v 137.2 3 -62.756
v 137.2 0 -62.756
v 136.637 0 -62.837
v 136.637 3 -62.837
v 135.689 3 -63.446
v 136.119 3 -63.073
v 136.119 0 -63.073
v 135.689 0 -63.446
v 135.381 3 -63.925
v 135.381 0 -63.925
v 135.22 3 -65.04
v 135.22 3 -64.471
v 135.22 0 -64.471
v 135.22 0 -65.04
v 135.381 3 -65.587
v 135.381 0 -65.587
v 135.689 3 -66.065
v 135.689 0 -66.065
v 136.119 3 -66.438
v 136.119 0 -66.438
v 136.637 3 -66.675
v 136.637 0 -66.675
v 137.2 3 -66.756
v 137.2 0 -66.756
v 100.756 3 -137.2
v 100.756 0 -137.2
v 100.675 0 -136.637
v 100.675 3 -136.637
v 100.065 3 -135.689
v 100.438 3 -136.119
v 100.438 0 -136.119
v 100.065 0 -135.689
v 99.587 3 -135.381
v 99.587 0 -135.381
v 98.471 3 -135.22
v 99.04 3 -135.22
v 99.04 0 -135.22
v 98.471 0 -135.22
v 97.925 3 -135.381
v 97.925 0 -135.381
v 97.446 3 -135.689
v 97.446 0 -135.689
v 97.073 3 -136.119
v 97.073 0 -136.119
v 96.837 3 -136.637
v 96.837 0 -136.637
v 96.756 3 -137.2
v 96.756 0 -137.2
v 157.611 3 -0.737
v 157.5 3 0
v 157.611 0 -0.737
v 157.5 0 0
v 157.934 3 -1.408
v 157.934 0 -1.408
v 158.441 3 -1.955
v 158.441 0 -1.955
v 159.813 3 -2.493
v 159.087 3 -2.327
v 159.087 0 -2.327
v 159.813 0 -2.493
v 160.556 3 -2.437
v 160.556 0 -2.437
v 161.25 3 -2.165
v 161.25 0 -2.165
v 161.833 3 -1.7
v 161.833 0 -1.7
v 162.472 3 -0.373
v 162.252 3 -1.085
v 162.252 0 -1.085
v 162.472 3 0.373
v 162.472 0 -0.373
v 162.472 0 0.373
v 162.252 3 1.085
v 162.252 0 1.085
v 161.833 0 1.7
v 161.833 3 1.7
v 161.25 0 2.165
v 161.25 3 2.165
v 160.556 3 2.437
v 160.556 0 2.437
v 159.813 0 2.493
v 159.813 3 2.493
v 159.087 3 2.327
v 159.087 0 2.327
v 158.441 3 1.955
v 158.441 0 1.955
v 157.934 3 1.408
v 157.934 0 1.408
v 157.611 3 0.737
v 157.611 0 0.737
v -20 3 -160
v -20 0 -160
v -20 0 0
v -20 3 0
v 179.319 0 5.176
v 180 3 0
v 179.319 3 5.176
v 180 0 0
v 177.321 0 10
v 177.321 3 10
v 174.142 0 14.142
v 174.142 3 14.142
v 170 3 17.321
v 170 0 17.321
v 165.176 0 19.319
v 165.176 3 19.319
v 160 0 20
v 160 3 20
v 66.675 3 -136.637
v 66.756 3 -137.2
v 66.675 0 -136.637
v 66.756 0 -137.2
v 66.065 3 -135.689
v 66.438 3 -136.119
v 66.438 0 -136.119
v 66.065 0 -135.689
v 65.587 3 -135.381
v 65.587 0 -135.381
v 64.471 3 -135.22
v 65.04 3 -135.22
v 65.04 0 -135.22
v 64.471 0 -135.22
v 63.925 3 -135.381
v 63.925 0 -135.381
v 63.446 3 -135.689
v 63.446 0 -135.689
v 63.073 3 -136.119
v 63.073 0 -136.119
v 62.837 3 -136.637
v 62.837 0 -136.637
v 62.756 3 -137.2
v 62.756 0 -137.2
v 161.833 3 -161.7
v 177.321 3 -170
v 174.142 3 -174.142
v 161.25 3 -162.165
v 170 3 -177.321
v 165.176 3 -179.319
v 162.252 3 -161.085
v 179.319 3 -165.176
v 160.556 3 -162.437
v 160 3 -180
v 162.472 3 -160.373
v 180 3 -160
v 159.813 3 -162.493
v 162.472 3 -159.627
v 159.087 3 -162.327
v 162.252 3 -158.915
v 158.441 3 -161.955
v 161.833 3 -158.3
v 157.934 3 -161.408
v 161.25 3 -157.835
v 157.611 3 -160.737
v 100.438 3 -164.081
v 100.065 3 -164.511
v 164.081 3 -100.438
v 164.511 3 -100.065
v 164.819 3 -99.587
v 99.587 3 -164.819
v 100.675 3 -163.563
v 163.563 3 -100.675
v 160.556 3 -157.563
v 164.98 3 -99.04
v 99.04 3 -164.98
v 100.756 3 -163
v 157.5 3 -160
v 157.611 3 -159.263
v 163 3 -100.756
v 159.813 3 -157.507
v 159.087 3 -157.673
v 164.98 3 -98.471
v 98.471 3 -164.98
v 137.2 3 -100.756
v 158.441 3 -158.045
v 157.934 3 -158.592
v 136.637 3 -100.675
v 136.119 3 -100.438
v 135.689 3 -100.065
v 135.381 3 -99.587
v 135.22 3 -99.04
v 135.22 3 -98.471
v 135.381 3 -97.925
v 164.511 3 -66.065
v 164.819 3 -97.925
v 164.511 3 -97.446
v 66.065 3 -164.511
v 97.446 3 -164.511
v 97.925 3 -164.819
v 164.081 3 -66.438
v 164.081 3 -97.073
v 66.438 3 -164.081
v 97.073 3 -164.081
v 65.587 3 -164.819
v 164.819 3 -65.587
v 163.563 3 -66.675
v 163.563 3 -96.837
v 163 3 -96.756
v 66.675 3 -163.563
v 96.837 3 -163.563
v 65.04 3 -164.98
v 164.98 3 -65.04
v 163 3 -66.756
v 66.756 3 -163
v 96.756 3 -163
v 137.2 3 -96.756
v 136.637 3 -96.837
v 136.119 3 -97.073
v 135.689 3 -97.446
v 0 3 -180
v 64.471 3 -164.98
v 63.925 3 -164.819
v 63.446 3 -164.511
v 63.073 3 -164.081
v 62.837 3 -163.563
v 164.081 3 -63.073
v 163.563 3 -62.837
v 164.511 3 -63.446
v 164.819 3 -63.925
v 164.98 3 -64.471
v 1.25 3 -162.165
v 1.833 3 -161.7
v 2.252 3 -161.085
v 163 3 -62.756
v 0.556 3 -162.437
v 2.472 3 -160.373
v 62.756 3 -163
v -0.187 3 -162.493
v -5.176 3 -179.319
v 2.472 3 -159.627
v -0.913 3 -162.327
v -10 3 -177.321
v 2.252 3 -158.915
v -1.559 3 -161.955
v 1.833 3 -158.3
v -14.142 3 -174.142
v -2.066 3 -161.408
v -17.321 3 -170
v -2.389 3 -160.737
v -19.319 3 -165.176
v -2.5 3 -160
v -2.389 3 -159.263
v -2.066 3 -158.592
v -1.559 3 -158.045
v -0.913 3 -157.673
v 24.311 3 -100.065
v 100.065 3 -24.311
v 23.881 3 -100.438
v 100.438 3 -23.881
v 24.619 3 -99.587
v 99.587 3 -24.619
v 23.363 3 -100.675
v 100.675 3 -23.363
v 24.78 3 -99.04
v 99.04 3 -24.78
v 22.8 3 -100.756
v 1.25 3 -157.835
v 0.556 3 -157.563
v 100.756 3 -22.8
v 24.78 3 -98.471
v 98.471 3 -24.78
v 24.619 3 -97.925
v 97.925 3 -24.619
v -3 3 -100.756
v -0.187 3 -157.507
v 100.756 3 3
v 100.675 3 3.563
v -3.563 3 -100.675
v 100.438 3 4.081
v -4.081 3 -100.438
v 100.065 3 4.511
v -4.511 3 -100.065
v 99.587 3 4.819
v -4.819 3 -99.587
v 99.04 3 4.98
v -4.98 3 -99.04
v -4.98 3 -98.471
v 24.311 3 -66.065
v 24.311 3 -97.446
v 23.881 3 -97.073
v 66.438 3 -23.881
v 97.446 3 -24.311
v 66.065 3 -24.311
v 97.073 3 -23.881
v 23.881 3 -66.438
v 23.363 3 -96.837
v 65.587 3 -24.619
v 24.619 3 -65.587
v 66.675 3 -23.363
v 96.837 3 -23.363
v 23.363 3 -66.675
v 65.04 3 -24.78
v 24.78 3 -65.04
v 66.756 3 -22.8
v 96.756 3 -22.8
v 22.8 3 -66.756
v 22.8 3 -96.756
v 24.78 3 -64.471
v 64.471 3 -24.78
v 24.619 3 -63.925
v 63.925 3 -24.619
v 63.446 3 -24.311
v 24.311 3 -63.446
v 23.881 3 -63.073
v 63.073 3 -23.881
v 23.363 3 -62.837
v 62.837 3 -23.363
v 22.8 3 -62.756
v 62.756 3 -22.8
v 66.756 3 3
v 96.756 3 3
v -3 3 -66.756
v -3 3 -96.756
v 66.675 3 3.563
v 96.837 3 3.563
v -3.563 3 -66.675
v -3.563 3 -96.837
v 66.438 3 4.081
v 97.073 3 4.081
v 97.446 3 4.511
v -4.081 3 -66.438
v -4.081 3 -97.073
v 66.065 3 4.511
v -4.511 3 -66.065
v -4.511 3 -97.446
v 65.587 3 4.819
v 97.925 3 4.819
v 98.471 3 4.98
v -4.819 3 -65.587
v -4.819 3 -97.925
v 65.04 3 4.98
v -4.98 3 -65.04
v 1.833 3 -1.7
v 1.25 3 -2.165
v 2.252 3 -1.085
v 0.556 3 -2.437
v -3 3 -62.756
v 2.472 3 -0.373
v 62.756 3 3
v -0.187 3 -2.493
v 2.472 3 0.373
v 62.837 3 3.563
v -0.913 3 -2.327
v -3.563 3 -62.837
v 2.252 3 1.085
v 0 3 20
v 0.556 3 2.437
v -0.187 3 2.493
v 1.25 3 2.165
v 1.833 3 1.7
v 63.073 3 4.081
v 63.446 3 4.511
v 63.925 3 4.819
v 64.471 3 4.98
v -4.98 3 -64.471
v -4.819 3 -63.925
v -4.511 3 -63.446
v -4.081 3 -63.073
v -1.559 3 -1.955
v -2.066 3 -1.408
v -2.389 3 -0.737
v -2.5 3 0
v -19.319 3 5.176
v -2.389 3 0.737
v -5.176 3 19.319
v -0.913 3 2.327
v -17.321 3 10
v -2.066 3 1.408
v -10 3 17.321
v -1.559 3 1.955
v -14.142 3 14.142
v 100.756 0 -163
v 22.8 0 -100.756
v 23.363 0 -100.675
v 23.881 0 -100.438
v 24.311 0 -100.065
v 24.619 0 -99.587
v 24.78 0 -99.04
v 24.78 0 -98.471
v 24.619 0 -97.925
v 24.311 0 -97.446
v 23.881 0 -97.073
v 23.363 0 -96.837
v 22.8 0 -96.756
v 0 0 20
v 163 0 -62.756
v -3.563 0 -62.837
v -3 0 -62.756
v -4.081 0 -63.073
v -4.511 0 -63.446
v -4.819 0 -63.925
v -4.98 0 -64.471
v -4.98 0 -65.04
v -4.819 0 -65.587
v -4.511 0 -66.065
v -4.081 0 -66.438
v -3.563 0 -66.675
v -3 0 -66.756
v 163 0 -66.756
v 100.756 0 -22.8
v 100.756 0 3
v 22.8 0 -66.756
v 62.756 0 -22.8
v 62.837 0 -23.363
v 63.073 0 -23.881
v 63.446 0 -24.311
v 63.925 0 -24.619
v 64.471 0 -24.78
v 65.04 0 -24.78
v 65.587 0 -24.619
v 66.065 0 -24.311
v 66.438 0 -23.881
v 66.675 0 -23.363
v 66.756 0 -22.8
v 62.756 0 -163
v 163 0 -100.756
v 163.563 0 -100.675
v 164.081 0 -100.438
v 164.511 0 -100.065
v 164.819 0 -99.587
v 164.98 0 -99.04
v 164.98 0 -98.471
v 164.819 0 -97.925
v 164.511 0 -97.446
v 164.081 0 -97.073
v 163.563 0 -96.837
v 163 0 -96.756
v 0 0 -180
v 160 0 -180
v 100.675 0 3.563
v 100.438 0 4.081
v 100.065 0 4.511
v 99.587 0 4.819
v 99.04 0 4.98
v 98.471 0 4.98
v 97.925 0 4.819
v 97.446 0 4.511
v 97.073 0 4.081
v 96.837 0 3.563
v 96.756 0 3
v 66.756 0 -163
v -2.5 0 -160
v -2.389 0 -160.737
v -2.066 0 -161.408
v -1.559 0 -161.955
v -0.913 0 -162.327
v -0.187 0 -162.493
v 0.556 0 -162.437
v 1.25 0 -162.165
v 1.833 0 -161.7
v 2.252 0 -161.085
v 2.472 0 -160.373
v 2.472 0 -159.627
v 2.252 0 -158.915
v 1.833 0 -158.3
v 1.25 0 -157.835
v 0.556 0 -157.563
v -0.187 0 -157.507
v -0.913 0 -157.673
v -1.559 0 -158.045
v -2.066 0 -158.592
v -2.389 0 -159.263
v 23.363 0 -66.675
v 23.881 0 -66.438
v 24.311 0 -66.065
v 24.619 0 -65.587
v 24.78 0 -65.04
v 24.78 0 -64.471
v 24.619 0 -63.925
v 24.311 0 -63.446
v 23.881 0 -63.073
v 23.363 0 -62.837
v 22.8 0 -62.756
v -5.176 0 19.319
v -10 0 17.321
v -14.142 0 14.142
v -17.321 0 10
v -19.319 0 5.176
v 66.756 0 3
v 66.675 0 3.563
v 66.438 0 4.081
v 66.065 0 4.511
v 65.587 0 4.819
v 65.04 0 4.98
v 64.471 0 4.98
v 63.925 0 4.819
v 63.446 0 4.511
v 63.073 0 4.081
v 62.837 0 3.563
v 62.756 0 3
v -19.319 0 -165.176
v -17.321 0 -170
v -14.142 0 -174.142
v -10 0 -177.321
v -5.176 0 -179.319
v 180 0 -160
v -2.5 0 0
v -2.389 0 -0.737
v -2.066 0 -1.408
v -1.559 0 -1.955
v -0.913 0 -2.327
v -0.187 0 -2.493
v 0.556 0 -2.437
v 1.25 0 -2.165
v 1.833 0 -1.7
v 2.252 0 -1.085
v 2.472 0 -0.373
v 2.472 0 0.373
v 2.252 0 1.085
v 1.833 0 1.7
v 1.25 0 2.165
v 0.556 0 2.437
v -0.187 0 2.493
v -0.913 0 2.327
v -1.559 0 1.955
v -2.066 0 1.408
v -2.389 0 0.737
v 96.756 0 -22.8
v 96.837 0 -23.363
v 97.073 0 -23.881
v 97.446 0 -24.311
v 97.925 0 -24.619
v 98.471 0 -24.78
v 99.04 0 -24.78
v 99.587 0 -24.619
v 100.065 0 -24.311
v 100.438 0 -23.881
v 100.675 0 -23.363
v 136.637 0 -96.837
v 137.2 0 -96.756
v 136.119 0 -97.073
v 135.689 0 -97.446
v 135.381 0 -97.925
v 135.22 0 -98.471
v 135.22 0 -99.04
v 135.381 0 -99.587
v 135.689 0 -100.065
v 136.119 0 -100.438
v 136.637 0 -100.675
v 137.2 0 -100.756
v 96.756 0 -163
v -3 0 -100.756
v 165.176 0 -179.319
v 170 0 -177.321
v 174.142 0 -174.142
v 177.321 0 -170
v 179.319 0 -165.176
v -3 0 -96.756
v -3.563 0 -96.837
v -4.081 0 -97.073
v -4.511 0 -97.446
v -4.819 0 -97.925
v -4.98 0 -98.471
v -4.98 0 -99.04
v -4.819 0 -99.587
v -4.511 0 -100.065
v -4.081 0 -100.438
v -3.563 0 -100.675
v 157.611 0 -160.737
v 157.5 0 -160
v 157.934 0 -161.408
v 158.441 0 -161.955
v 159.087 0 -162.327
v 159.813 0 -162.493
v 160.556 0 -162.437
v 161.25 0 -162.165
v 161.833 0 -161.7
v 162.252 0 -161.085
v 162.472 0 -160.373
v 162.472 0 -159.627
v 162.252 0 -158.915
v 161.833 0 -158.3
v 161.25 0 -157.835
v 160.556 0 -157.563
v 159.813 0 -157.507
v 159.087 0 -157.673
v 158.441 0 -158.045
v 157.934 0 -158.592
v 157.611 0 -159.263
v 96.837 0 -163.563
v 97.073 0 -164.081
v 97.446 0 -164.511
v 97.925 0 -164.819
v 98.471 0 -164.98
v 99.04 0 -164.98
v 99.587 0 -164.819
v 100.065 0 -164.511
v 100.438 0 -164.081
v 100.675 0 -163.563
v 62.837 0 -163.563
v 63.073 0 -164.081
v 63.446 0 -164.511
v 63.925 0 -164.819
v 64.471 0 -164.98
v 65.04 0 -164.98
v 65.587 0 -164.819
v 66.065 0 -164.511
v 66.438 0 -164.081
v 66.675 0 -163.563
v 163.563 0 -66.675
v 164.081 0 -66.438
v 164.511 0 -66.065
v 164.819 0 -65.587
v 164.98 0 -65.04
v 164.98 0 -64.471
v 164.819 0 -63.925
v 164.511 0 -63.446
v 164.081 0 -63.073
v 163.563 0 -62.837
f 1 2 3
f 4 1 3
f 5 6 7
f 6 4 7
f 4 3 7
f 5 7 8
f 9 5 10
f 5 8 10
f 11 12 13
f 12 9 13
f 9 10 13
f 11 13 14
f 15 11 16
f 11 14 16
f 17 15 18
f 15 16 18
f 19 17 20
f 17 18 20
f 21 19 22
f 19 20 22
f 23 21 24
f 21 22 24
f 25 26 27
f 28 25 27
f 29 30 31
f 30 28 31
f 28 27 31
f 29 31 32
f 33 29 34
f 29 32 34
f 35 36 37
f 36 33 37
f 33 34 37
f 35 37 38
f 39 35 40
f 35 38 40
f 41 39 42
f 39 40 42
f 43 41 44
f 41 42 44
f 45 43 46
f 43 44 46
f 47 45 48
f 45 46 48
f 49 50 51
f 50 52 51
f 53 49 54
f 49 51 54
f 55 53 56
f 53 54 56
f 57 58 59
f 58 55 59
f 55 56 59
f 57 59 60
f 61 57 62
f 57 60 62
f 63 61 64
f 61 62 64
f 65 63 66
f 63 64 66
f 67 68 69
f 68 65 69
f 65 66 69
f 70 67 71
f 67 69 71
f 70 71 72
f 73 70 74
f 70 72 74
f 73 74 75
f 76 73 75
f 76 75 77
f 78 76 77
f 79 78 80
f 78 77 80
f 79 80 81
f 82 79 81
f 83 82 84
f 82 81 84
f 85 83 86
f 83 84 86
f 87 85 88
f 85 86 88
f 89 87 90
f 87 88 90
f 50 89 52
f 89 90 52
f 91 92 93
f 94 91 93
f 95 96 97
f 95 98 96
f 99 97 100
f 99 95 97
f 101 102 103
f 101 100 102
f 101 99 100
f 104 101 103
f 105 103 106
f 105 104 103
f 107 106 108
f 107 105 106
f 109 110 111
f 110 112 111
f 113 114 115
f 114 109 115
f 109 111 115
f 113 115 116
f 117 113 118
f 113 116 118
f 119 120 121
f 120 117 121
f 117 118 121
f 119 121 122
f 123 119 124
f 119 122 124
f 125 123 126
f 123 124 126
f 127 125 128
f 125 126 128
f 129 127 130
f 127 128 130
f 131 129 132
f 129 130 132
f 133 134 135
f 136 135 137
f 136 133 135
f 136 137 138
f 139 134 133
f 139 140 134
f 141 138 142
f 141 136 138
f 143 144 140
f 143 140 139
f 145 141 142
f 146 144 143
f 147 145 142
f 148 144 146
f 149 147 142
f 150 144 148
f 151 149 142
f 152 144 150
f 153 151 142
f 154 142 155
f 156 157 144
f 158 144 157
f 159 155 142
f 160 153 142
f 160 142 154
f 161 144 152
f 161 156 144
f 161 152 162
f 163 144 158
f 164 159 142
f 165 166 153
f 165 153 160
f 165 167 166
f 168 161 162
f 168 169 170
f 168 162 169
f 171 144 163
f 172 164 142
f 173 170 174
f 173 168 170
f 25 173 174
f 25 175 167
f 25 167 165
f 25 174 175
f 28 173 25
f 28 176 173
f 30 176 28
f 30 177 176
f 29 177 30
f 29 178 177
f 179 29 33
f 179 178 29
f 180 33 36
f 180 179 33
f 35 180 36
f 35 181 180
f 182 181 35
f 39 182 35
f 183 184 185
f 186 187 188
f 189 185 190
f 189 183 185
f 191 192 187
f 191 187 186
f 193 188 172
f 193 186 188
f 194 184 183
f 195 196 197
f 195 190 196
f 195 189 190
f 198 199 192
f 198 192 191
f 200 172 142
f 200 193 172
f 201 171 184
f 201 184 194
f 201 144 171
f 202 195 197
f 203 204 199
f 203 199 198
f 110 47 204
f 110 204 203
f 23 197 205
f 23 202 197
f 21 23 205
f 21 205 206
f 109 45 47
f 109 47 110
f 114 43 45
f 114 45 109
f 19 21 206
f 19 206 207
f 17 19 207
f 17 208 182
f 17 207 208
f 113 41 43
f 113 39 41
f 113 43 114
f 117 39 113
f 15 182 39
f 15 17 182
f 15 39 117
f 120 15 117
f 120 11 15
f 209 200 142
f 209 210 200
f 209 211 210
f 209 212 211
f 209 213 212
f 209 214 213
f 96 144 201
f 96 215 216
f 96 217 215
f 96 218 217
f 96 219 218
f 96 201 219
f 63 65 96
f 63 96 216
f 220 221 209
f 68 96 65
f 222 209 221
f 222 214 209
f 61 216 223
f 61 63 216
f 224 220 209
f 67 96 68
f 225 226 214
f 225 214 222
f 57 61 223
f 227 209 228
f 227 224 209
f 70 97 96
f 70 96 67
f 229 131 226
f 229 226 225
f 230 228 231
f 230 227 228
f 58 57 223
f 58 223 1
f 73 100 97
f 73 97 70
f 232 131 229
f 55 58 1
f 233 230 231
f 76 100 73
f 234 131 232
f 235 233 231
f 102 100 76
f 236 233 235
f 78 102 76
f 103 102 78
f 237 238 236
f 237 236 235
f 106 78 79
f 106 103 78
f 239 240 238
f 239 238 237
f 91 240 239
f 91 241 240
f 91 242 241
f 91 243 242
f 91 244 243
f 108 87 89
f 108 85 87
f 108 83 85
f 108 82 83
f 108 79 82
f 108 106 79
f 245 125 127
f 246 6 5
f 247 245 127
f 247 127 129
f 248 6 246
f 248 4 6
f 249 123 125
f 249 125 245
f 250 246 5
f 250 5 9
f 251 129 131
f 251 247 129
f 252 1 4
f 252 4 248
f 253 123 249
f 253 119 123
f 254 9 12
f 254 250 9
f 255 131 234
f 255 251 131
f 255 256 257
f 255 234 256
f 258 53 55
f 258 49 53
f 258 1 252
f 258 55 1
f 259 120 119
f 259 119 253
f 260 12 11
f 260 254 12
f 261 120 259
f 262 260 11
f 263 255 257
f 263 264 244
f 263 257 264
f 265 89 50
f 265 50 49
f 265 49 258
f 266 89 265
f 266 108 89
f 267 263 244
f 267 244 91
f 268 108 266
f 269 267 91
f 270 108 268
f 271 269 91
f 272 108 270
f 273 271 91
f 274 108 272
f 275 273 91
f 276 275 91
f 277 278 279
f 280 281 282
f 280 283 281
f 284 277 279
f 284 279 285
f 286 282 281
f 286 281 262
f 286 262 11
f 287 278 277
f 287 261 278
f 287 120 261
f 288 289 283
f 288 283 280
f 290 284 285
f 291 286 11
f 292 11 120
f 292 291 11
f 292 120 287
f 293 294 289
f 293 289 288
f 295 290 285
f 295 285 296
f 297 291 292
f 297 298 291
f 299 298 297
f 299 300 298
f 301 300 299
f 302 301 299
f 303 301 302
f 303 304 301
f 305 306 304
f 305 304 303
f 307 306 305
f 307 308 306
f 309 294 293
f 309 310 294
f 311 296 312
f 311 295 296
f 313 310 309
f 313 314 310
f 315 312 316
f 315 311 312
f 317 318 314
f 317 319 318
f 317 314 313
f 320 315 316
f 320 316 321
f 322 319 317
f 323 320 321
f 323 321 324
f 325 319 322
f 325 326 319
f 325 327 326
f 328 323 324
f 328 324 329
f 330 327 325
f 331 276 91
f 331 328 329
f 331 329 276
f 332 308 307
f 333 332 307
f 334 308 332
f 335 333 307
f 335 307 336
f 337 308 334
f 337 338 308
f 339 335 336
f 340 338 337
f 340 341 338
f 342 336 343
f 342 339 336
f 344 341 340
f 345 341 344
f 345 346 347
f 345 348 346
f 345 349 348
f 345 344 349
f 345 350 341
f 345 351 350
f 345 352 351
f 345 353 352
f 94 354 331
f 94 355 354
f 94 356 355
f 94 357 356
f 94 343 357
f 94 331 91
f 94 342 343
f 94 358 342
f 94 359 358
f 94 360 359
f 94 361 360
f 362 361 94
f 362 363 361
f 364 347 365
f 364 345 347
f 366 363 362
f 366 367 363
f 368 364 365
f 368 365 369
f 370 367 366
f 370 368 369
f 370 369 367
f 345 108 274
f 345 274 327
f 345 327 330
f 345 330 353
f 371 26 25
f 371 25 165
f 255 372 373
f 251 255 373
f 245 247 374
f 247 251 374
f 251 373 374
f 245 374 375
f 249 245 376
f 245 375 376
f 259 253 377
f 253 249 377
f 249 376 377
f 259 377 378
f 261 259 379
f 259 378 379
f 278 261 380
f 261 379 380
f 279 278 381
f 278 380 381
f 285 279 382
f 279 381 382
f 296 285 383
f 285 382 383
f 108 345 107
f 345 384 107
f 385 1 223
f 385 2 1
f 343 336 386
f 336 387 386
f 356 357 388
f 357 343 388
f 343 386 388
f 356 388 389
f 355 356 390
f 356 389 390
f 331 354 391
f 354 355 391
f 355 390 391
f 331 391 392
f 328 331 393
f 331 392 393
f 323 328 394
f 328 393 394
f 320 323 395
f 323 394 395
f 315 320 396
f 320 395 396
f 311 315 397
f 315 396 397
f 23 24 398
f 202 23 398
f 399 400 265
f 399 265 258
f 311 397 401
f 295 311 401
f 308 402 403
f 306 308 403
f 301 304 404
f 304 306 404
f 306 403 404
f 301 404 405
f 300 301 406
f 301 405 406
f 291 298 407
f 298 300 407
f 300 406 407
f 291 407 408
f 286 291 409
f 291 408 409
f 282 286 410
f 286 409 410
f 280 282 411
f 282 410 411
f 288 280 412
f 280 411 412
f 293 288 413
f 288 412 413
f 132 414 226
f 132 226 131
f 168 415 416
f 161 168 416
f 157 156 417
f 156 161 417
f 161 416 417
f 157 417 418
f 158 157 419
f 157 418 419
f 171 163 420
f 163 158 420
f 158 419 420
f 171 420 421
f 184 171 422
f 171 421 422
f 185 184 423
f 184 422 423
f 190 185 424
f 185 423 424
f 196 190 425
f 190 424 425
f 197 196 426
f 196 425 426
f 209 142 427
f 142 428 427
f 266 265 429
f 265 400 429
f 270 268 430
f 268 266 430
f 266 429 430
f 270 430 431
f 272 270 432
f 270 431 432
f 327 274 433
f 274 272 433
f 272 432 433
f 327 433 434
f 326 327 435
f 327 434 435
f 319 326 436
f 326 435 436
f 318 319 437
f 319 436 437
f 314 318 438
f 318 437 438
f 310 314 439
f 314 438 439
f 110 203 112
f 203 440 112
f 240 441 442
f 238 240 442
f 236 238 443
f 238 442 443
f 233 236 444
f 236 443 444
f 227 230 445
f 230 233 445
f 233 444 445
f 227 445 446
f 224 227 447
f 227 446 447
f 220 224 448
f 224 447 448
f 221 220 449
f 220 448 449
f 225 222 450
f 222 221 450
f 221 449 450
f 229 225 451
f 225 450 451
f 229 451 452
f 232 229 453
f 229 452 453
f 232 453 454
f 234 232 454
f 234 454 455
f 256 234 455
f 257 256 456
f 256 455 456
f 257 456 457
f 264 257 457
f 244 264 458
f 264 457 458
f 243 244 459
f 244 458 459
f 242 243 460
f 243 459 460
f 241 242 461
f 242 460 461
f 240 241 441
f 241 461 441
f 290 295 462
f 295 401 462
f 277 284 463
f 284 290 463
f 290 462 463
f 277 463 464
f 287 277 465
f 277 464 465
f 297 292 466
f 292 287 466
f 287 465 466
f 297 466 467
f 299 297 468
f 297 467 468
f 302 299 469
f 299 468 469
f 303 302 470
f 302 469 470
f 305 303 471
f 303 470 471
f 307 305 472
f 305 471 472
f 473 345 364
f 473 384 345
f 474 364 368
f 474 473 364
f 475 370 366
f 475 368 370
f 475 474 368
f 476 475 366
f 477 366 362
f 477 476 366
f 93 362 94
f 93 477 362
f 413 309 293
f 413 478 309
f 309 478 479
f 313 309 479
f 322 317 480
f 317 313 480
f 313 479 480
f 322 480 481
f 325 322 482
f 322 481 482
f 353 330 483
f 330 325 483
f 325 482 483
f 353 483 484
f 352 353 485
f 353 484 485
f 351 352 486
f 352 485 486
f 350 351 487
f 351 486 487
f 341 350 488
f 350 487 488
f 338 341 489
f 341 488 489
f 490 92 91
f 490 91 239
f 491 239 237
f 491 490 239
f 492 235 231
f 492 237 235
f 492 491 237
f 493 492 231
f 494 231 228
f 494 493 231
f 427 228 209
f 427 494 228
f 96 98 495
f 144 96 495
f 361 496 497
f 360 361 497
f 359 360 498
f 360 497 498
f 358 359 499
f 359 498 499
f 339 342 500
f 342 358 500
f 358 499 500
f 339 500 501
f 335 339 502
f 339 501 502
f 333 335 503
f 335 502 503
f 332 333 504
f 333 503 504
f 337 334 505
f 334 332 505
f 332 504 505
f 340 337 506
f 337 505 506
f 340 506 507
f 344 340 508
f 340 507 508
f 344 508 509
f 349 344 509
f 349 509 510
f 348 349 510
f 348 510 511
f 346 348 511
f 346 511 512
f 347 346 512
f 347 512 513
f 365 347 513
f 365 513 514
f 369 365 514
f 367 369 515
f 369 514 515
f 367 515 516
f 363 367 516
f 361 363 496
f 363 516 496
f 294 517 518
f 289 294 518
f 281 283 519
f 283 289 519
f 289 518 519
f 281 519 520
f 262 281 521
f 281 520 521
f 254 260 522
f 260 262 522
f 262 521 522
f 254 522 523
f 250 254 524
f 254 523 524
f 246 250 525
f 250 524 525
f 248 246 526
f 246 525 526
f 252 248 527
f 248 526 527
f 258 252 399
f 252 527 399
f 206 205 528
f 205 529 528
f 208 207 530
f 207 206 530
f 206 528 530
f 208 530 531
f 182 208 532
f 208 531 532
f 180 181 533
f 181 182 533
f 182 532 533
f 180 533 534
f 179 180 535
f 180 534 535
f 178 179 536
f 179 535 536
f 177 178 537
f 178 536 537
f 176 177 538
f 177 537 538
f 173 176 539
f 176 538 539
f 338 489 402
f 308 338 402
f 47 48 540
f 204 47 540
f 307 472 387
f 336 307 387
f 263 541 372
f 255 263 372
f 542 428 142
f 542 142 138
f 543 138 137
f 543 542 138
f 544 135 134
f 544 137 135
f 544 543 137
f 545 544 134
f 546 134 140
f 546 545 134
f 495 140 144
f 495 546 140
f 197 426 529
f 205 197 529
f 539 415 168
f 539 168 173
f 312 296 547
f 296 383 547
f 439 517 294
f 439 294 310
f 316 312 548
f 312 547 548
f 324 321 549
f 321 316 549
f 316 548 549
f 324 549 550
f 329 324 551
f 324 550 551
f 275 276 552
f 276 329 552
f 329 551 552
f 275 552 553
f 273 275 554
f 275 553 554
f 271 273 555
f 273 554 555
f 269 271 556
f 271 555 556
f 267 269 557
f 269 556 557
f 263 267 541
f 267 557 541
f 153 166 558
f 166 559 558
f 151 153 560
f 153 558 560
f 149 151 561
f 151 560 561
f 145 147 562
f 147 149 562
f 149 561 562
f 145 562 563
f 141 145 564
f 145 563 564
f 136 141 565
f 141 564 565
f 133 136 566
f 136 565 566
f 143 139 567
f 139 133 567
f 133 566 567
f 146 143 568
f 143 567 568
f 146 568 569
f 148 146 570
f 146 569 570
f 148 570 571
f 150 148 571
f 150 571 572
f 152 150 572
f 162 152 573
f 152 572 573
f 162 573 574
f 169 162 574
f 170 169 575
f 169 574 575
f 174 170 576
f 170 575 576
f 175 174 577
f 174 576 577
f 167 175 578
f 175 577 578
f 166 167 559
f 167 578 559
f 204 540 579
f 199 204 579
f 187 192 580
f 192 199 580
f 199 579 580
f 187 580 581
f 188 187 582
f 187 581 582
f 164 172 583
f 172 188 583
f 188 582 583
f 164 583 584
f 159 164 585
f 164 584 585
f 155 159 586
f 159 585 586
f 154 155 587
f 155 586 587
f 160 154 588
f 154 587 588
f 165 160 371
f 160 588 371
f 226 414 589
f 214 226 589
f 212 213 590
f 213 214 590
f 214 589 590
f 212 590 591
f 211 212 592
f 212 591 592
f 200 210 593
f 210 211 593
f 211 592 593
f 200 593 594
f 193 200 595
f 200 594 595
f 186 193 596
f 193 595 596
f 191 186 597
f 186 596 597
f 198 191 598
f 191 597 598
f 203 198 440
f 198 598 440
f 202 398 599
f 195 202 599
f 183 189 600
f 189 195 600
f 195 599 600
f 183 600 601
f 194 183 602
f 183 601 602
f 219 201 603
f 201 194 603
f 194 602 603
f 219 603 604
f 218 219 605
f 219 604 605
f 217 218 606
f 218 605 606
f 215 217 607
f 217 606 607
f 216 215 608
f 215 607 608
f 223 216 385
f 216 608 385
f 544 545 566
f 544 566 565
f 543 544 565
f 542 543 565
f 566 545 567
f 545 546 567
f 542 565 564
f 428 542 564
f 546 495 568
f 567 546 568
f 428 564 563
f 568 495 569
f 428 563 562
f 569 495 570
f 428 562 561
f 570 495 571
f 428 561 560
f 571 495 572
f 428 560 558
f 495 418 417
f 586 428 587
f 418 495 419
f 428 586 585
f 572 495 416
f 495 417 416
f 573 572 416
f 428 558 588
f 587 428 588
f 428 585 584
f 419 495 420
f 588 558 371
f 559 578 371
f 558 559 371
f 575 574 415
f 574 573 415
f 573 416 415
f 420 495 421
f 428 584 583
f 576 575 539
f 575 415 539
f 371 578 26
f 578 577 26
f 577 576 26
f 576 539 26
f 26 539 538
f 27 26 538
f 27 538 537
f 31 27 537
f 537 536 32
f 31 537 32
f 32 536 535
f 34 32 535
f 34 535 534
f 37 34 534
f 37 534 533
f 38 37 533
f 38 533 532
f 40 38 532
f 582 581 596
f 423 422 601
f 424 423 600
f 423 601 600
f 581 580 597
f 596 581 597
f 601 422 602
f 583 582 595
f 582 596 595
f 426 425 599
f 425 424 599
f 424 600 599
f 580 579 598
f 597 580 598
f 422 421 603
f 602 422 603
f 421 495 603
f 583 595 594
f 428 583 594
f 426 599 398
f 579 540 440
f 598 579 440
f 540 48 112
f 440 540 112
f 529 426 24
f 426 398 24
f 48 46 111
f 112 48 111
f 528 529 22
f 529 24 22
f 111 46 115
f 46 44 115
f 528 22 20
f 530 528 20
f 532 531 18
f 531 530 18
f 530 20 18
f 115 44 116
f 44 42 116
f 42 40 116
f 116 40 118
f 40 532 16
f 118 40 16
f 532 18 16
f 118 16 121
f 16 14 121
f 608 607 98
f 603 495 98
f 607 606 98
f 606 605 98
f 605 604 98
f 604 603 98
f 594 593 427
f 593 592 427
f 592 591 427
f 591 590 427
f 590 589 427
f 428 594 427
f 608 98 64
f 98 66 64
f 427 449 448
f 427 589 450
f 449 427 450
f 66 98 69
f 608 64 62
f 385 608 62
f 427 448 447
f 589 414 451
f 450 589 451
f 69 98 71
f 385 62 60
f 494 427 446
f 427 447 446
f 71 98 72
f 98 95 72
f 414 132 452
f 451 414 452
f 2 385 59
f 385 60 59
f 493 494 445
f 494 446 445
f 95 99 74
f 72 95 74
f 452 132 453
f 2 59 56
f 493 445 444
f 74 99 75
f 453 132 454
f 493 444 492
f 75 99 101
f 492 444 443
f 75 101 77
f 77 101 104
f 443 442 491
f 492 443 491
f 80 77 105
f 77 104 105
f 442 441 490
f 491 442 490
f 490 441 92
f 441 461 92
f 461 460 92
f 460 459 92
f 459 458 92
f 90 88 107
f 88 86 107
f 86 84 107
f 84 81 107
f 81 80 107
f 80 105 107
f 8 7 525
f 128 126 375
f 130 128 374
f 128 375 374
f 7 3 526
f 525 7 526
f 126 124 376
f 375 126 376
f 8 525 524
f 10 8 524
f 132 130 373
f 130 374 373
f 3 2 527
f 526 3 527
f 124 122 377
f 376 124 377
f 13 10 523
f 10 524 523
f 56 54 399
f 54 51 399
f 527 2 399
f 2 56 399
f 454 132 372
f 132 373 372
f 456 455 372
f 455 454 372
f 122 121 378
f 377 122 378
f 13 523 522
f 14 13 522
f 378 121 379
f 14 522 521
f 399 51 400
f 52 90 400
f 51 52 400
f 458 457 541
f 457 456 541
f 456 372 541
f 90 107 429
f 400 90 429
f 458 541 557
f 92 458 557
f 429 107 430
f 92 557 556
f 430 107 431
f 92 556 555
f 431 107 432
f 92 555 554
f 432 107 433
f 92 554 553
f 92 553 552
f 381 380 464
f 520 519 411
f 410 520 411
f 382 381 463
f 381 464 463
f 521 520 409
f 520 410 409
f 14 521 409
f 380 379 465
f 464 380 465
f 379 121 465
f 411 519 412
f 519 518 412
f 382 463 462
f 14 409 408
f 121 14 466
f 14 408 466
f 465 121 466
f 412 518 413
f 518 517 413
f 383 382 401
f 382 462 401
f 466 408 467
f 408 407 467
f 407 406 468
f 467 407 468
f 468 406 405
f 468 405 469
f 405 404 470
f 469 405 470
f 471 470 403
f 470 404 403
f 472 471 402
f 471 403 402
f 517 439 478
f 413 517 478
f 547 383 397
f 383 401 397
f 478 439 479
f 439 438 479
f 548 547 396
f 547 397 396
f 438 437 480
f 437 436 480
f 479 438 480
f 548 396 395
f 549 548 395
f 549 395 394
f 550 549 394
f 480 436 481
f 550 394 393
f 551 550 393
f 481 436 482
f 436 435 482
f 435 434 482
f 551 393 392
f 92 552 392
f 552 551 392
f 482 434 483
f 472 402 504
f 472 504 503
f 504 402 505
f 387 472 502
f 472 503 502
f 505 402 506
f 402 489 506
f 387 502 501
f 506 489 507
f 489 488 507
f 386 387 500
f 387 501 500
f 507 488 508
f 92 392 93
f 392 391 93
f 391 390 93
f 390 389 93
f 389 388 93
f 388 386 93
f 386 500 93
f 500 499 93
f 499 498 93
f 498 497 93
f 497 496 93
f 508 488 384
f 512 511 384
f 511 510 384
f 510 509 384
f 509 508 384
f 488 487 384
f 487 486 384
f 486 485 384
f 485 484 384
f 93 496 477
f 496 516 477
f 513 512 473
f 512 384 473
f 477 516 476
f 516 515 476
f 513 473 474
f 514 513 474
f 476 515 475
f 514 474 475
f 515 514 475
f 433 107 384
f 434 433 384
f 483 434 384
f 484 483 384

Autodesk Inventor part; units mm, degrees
ref_plane "YZ Plane" through (0, 0, 0) normal (1, 0, 0) x (0, 1, 0)
ref_plane "XZ Plane" through (0, 0, 0) normal (0, 1, 0) x (-1, 0, 0)
ref_plane "XY Plane" through (0, 0, 0) normal (0, 0, 1) x (1, 0, 0)
sketch "Sketch1" plane through (0, 0, 0) normal (0, 1, 0) x (-1, 0, 0)
  line L0 (0, 20) -> (-160, 20)
  circle A0 centre (0, -160) radius 2.5
  arc A1 (0, -180) -> (20, -160) centre (0, -160) ccw
  line L1 (0, 20) -> (-160, 20)
  arc A2 (-137.2, -66.7557) -> (-137.2, -62.7557) centre (-137.2, -64.7557) ccw
  arc A3 (-137.2, -66.7557) -> (-137.2, -62.7557) centre (-137.2, -64.7557) ccw
  line L2 (-137.2, -62.7557) -> (-163, -62.7557)
  line L3 (-137.2, -66.7557) -> (-163, -66.7557)
  arc A4 (-137.2, -100.7557) -> (-137.2, -96.7557) centre (-137.2, -98.7557) ccw
  circle A5 centre (-160, -160) radius 2.5
  circle A6 centre (-160, -160) radius 2.5
  line L4 (20, -160) -> (20, 0)
  line L5 (-180, 0) -> (-180, -160)
  line L6 (20, -160) -> (20, 0)
  line L7 (-180, 0) -> (-180, -160)
  line L8 (-160, -180) -> (0, -180)
  line L9 (-160, -180) -> (0, -180)
  arc A7 (-180, -160) -> (-160, -180) centre (-160, -160) ccw
  arc A8 (-180, -160) -> (-160, -180) centre (-160, -160) ccw
  arc A9 (-137.2, -100.7557) -> (-137.2, -96.7557) centre (-137.2, -98.7557) ccw
  arc A10 (0, -180) -> (20, -160) centre (0, -160) ccw
  circle A11 centre (0, -160) radius 2.5
  circle A12 centre (0, 0) radius 2.5
  arc A13 (20, 0) -> (0, 20) centre (0, 0) ccw
  arc A14 (20, 0) -> (0, 20) centre (0, 0) ccw
  circle A15 centre (0, 0) radius 2.5
  arc A16 (-163, -62.7557) -> (-163, -66.7557) centre (-163, -64.7557) ccw
  line L10 (-163, -96.7557) -> (-137.2, -96.7557)
  arc A17 (3, -66.7557) -> (3, -62.7557) centre (3, -64.7557) ccw
  arc A18 (3, -66.7557) -> (3, -62.7557) centre (3, -64.7557) ccw
  circle A19 centre (-160, 0) radius 2.5
  circle A20 centre (-160, 0) radius 2.5
  arc A21 (-160, 20) -> (-180, 0) centre (-160, 0) ccw
  arc A22 (-160, 20) -> (-180, 0) centre (-160, 0) ccw
  line L11 (-163, -66.7557) -> (-137.2, -66.7557)
  line L12 (-163, -100.7557) -> (-137.2, -100.7557)
  line L13 (-137.2, -100.7557) -> (-163, -100.7557)
  line L14 (-137.2, -96.7557) -> (-163, -96.7557)
  arc A23 (-163, -62.7557) -> (-163, -66.7557) centre (-163, -64.7557) ccw
  line L15 (-163, -62.7557) -> (-137.2, -62.7557)
  arc A24 (-163, -96.7557) -> (-163, -100.7557) centre (-163, -98.7557) ccw
  arc A25 (-163, -96.7557) -> (-163, -100.7557) centre (-163, -98.7557) ccw
  arc A26 (-22.8, -62.7557) -> (-22.8, -66.7557) centre (-22.8, -64.7557) ccw
  arc A27 (-22.8, -62.7557) -> (-22.8, -66.7557) centre (-22.8, -64.7557) ccw
  line L16 (-22.8, -62.7557) -> (3, -62.7557)
  line L17 (3, -62.7557) -> (-22.8, -62.7557)
  line L18 (3, -66.7557) -> (-22.8, -66.7557)
  line L19 (-22.8, -66.7557) -> (3, -66.7557)
  line L20 (-22.8, -96.7557) -> (3, -96.7557)
  line L21 (3, -96.7557) -> (-22.8, -96.7557)
  arc A28 (-22.8, -96.7557) -> (-22.8, -100.7557) centre (-22.8, -98.7557) ccw
  arc A29 (-22.8, -96.7557) -> (-22.8, -100.7557) centre (-22.8, -98.7557) ccw
  arc A30 (3, -100.7557) -> (3, -96.7557) centre (3, -98.7557) ccw
  arc A31 (3, -100.7557) -> (3, -96.7557) centre (3, -98.7557) ccw
  line L22 (3, -100.7557) -> (-22.8, -100.7557)
  line L23 (-22.8, -100.7557) -> (3, -100.7557)
  line L24 (-22.8, -66.7557) -> (3, -66.7557)
  line L25 (3, -62.7557) -> (-22.8, -62.7557)
  arc A32 (-22.8, -62.7557) -> (-22.8, -66.7557) centre (-22.8, -64.7557) ccw
  arc A33 (3, -66.7557) -> (3, -62.7557) centre (3, -64.7557) ccw
  arc A34 (20, 0) -> (0, 20) centre (0, 0) ccw
  arc A35 (20, 0) -> (0, 20) centre (0, 0) ccw
  line L26 (0, 20) -> (-160, 20)
  circle A36 centre (0, 0) radius 2.5
  circle A37 centre (0, 0) radius 2.5
  line L27 (0, 20) -> (-160, 20)
  line L28 (20, -160) -> (20, 0)
  line L29 (20, -160) -> (20, 0)
  arc A38 (0, -180) -> (20, -160) centre (0, -160) ccw
  arc A39 (0, -180) -> (20, -160) centre (0, -160) ccw
  line L30 (-66.7557, -163) -> (-66.7557, -137.2)
  line L31 (-66.7557, -137.2) -> (-66.7557, -163)
  arc A40 (-66.7557, -163) -> (-62.7557, -163) centre (-64.7557, -163) ccw
  arc A41 (-66.7557, -163) -> (-62.7557, -163) centre (-64.7557, -163) ccw
  line L32 (-96.7557, -137.2) -> (-96.7557, -163)
  line L33 (-96.7557, -163) -> (-96.7557, -137.2)
  line L34 (-100.7557, -137.2) -> (-100.7557, -163)
  line L35 (-160, -180) -> (0, -180)
  line L36 (-160, -180) -> (0, -180)
  arc A42 (-180, -160) -> (-160, -180) centre (-160, -160) ccw
  arc A43 (-100.7557, -163) -> (-96.7557, -163) centre (-98.7557, -163) ccw
  arc A44 (-180, -160) -> (-160, -180) centre (-160, -160) ccw
  arc A45 (-160, 20) -> (-180, 0) centre (-160, 0) ccw
  arc A46 (-160, 20) -> (-180, 0) centre (-160, 0) ccw
  circle A47 centre (-160, 0) radius 2.5
  circle A48 centre (-160, 0) radius 2.5
  line L37 (-180, 0) -> (-180, -160)
  line L38 (-180, 0) -> (-180, -160)
  arc A49 (-96.7557, -137.2) -> (-100.7557, -137.2) centre (-98.7557, -137.2) ccw
  circle A50 centre (-160, -160) radius 2.5
  circle A51 centre (-160, -160) radius 2.5
  arc A52 (-96.7557, -137.2) -> (-100.7557, -137.2) centre (-98.7557, -137.2) ccw
  circle A53 centre (0, -160) radius 2.5
  circle A54 centre (0, -160) radius 2.5
  line L39 (-62.7557, -163) -> (-62.7557, -137.2)
  line L40 (-62.7557, -137.2) -> (-62.7557, -163)
  arc A55 (-62.7557, -137.2) -> (-66.7557, -137.2) centre (-64.7557, -137.2) ccw
  arc A56 (-62.7557, -137.2) -> (-66.7557, -137.2) centre (-64.7557, -137.2) ccw
  line L41 (-100.7557, -163) -> (-100.7557, -137.2)
  line L42 (-96.7557, -22.8) -> (-96.7557, 3)
  line L43 (-96.7557, 3) -> (-96.7557, -22.8)
  arc A57 (-96.7557, 3) -> (-100.7557, 3) centre (-98.7557, 3) ccw
  arc A58 (-96.7557, 3) -> (-100.7557, 3) centre (-98.7557, 3) ccw
  line L44 (-100.7557, 3) -> (-100.7557, -22.8)
  arc A59 (-100.7557, -22.8) -> (-96.7557, -22.8) centre (-98.7557, -22.8) ccw
  arc A60 (-100.7557, -22.8) -> (-96.7557, -22.8) centre (-98.7557, -22.8) ccw
  line L45 (-100.7557, -22.8) -> (-100.7557, 3)
  arc A61 (-66.7557, -22.8) -> (-62.7557, -22.8) centre (-64.7557, -22.8) ccw
  line L46 (-66.7557, 3) -> (-66.7557, -22.8)
  line L47 (-66.7557, -22.8) -> (-66.7557, 3)
  arc A62 (-66.7557, -22.8) -> (-62.7557, -22.8) centre (-64.7557, -22.8) ccw
  arc A63 (-62.7557, 3) -> (-66.7557, 3) centre (-64.7557, 3) ccw
  line L48 (-62.7557, 3) -> (-62.7557, -22.8)
  line L49 (-62.7557, -22.8) -> (-62.7557, 3)
  arc A64 (-62.7557, 3) -> (-66.7557, 3) centre (-64.7557, 3) ccw
  arc A65 (-100.7557, -163) -> (-96.7557, -163) centre (-98.7557, -163) ccw
  point P0 (-22.8, -64.7557)
  point P1 (3, -64.7557)
extrude "Extrusion1" add sketch "Sketch1" along normal blind 3
properties part number "Baseprendronme"
